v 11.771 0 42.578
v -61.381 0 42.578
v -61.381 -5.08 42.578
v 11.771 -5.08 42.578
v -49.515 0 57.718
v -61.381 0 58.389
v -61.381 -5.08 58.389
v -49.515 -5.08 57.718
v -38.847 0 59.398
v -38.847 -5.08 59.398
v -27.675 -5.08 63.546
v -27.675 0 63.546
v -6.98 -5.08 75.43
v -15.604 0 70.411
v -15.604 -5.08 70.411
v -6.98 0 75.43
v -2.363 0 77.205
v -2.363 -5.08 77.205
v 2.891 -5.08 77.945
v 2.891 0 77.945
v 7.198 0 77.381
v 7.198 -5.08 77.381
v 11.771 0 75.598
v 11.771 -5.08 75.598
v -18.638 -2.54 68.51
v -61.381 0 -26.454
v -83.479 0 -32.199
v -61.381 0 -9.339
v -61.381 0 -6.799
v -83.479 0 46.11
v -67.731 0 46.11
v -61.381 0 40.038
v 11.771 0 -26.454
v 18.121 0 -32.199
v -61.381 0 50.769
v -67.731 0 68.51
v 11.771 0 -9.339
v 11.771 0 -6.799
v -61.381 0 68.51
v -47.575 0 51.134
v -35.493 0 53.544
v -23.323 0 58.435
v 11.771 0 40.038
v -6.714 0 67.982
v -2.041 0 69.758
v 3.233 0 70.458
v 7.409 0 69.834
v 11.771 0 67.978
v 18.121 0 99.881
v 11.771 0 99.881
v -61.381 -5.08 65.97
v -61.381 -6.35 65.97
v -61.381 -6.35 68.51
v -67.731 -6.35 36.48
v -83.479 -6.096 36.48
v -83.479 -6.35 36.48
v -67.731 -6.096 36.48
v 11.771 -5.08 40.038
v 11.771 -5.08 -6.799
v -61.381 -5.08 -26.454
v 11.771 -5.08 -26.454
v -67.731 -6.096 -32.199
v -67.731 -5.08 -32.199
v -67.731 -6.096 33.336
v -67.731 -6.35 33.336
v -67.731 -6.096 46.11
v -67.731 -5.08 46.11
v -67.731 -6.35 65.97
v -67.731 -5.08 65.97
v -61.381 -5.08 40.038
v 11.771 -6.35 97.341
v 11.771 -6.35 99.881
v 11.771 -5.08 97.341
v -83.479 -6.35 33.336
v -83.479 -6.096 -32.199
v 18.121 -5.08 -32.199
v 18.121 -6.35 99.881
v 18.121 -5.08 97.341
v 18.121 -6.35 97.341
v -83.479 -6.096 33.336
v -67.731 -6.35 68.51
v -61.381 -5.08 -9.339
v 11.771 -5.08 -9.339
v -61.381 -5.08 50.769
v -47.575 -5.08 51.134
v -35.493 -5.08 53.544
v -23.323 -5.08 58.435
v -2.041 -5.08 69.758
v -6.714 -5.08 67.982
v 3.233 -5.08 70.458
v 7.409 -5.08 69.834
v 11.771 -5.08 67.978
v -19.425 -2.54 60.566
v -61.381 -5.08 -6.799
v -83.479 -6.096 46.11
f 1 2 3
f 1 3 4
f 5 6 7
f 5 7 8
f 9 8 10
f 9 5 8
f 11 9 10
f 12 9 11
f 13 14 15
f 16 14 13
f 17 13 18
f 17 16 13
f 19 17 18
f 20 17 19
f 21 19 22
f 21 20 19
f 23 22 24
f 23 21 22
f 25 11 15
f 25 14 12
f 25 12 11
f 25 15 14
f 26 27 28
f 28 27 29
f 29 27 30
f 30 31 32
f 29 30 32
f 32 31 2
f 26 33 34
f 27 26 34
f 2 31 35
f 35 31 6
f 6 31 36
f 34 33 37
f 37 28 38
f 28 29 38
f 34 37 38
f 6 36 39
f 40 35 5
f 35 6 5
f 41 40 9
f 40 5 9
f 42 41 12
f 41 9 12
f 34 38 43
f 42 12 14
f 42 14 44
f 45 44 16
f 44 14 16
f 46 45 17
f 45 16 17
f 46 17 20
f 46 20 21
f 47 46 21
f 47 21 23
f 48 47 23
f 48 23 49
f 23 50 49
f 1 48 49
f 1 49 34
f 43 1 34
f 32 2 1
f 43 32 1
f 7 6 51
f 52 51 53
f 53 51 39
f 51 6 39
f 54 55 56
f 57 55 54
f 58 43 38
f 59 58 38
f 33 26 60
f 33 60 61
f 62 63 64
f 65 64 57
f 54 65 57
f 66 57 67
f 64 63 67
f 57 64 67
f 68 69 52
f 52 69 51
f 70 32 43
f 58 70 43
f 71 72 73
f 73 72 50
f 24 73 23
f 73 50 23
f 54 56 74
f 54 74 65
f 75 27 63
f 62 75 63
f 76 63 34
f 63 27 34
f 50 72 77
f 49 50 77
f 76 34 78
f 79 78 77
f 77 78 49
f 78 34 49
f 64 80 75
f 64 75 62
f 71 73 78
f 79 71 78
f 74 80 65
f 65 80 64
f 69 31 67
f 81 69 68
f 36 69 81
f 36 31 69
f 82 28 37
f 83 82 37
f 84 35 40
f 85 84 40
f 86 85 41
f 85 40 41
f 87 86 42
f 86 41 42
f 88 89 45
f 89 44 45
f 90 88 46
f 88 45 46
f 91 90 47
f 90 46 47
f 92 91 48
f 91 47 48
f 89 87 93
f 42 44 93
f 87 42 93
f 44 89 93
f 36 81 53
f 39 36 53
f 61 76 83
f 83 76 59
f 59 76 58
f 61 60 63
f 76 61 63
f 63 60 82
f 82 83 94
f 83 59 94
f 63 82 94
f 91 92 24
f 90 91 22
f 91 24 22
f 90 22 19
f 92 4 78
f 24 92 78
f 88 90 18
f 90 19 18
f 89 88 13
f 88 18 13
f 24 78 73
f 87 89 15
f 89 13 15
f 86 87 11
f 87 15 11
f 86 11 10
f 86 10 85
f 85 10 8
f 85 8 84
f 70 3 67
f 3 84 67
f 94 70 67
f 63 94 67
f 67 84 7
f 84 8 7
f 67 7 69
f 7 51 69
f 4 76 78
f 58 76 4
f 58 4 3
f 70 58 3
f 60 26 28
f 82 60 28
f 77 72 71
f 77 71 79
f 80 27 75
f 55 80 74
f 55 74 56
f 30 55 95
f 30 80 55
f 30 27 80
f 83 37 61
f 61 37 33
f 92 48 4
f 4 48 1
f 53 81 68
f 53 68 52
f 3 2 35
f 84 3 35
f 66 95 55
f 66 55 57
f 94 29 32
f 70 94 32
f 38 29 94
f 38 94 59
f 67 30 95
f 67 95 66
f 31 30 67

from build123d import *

# Parameters (mm, degrees)
F0_W     = 73.152
F0_H     = 5.744279672
F1_DEPTH = 5.08
F0_W_2   = 6.35
F0_H_2   = 2.54
F0_W_3   = 15.748
F0_H_3   = 3.1443536282
F2_DEPTH = 6.35
F0_H_4   = 9.6294713412
F0_H_5   = 65.5344708799
F3_DEPTH = 6.096
F4_DEPTH = 5.08
F5_DEPTH = 5.08


with BuildPart() as f1:
    # F0 (on Front) → F1 (new body)
    with BuildSketch(Plane.XZ):
        with BuildLine():
            add(Edge.make_bspline(
                [(-61.3806553816, 58.3893715901), (-43.8441733015, 55.5345989136), (-19.0644229117, 66.1410851266), (0, 81.7292685512), (11.7713446184, 75.597518316)],
                knots=[0, 0, 0, 0, 0.5425588266, 1, 1, 1, 1], degree=3))
            Line((-61.3806553816, 58.3893715901), (-61.3806553816, 50.7693715901))
            add(Edge.make_bspline(
                [(-61.3806553816, 50.7693715901), (-44.0213347189, 49.9104853444), (-20.1279301639, 57.0149364757), (0.0923789407, 74.6247452568), (11.7713446184, 67.977518316)],
                knots=[0, 0, 0, 0, 0.5368571136, 1, 1, 1, 1], degree=3))
            Line((11.7713446184, 67.977518316), (11.7713446184, 75.597518316))
        make_face()
        Polygon((-67.7306553816, 65.9703469514), (-67.7306553816, 46.1095218752), (-67.7306553816, 36.480050534), (-67.7306553816, 33.3356969059), (-67.7306553816, -32.198773974), (-61.3806553816, -32.198773974), (-61.3806553816, -26.454494302), (-61.3806553816, -9.338773974), (-61.3806553816, -6.798773974), (-61.3806553816, -1.905), (-61.3806553816, -0.9525), (-61.3806553816, 0), (-61.3806553816, 10.16), (-61.3806553816, 11.1125), (-61.3806553816, 12.065), (-61.3806553816, 40.037518316), (-61.3806553816, 42.577518316), (-61.3806553816, 43.1493715901), (-61.3806553816, 50.7693715901), (-61.3806553816, 58.3893715901), (-61.3806553816, 65.9703469514), align=None)
        with Locations((-24.8046553816, -29.326634138)):
            Rectangle(F0_W, F0_H)
        Polygon((11.7713446184, 97.341226026), (11.7713446184, 75.597518316), (11.7713446184, 67.977518316), (11.7713446184, 46.1095218752), (11.7713446184, 42.577518316), (11.7713446184, 40.037518316), (11.7713446184, 12.065), (11.7713446184, 11.1125), (11.7713446184, 10.16), (11.7713446184, 0), (11.7713446184, -0.9525), (11.7713446184, -1.905), (11.7713446184, -6.798773974), (11.7713446184, -9.338773974), (11.7713446184, -26.454494302), (11.7713446184, -32.198773974), (18.1213446184, -32.198773974), (18.1213446184, 97.341226026), align=None)
    extrude(amount=F1_DEPTH)

    # F0 (on Front) → F2 (join)
    with BuildSketch(Plane.XZ):
        with Locations((-64.5556553816, 67.2403469514)):
            Rectangle(F0_W_2, F0_H_2)
        with Locations((14.9463446184, 98.611226026)):
            Rectangle(F0_W_2, F0_H_2)
        with Locations((-75.6046553816, 34.9078737199)):
            Rectangle(F0_W_3, F0_H_3)
    extrude(amount=F2_DEPTH)

    # F0 (on Front) → F3 (join)
    with BuildSketch(Plane.XZ):
        with Locations((-75.6046553816, 41.2947862046)):
            Rectangle(F0_W_3, F0_H_4)
        with Locations((-75.6046553816, 0.5684614659)):
            Rectangle(F0_W_3, F0_H_5)
    extrude(amount=F3_DEPTH)

    # F0 (on Front) → F4 (join)
    with BuildSketch(Plane.XZ):
        with Locations((-24.8046553816, 41.307518316)):
            Rectangle(F0_W, F0_H_2)
    extrude(amount=F4_DEPTH)

    # F0 (on Front) → F5 (join)
    with BuildSketch(Plane.XZ):
        with Locations((-24.8046553816, -8.068773974)):
            Rectangle(F0_W, F0_H_2)
    extrude(amount=F5_DEPTH)


solid = f1.part
